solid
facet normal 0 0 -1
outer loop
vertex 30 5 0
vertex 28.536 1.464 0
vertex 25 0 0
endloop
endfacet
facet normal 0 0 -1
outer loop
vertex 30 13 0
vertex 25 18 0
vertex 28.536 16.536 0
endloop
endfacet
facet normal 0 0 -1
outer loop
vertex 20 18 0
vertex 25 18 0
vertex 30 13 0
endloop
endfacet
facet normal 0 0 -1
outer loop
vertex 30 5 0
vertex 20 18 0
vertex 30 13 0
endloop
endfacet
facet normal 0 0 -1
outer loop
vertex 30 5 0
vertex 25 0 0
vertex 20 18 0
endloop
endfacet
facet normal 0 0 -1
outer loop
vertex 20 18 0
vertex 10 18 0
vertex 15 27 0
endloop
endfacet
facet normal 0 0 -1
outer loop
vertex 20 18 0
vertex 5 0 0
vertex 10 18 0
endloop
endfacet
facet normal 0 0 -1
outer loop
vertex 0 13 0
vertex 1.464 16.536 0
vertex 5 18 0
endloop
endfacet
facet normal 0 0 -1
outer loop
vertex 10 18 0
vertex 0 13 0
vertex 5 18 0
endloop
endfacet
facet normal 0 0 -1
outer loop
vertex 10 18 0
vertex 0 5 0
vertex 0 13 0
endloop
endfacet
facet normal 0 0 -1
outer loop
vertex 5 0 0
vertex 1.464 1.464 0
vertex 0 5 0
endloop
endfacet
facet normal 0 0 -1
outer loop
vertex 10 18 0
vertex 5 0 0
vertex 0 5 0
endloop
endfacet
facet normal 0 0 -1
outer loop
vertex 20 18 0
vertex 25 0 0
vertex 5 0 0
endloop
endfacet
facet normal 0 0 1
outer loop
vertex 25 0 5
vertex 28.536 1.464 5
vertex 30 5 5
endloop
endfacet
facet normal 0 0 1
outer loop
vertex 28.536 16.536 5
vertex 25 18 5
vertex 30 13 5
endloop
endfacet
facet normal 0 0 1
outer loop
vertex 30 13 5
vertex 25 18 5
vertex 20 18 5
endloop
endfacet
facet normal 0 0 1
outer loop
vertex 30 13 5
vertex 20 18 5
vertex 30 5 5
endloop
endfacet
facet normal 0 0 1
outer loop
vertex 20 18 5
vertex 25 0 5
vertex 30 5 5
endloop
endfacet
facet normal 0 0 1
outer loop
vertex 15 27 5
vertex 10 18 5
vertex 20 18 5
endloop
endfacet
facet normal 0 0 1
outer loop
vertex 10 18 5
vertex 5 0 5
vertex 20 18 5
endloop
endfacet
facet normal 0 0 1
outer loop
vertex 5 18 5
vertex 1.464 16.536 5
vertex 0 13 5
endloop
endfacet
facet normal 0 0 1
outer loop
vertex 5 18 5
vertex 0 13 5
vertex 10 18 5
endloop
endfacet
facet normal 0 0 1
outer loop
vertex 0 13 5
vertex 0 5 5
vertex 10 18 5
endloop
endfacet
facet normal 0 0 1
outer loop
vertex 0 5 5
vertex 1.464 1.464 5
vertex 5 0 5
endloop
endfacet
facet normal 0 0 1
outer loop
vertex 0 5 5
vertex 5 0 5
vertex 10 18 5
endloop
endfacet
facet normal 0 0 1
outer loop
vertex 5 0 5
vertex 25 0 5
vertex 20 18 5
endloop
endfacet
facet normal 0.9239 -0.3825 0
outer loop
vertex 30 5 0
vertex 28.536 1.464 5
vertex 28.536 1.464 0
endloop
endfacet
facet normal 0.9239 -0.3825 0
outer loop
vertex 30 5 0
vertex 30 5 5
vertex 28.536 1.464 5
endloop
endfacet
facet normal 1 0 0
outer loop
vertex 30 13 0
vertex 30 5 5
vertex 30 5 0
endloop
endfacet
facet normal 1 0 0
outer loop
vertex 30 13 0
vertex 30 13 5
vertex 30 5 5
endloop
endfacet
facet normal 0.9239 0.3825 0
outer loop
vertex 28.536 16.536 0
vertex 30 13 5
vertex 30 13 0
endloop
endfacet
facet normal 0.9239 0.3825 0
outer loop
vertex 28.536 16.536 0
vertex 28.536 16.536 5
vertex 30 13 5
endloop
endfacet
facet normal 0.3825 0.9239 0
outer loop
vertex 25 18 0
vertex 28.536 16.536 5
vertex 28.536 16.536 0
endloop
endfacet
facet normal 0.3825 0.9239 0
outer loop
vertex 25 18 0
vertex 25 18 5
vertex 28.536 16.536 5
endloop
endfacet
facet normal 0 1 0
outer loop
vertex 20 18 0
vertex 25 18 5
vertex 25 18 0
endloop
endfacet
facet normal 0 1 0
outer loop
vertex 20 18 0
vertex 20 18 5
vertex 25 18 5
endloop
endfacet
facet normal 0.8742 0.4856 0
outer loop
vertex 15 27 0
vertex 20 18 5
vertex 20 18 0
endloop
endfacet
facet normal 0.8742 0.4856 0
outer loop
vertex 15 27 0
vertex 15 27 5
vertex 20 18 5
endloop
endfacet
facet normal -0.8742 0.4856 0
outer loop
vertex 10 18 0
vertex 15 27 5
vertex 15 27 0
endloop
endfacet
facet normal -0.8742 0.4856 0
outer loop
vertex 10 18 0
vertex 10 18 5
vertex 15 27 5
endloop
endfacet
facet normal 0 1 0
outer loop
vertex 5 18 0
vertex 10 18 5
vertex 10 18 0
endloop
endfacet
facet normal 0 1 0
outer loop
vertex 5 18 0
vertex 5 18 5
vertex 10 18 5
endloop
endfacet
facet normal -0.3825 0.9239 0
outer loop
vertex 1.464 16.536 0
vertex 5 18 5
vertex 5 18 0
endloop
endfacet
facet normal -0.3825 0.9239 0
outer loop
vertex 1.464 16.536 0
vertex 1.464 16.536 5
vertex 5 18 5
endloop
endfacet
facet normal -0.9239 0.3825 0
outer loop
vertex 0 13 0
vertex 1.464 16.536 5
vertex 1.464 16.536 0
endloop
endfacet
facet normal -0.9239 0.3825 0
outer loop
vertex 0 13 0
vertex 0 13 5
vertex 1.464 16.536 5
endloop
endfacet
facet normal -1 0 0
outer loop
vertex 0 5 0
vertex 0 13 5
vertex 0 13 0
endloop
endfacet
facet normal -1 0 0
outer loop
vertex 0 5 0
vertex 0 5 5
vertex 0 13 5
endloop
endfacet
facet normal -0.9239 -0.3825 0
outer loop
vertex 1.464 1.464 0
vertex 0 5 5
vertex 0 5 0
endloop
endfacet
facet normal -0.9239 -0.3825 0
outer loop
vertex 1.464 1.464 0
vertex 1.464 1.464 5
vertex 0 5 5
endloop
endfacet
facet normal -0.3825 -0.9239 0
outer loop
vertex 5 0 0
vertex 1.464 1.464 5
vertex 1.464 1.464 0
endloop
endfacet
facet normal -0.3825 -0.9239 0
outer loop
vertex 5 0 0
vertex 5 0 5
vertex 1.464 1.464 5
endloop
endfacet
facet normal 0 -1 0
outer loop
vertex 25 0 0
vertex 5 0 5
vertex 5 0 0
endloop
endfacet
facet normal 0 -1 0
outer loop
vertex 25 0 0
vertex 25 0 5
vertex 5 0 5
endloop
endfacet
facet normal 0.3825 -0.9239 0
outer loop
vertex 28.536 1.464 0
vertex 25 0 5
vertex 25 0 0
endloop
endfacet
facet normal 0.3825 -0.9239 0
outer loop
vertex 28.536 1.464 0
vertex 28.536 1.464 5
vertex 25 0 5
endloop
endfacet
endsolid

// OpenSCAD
$fn = 32;

// ----------------------------------------------------------------------
// Ratchet pawl: 30 x 18 mm body, beak 9 mm сверху
// ----------------------------------------------------------------------

// --- parameters (mm) ---
profile_height = 5;       // extrusion height
profile_points = 15;      // points of the closed outline

profile = [[0, 5], [1.464, 1.464], [5, 0], [25, 0], [28.536, 1.464], [30, 5], [30, 13], [28.536, 16.536], [25, 18], [20, 18], [15, 27], [10, 18], [5, 18], [1.464, 16.536], [0, 13]];  // single closed polygon, 15 points, counter clockwise

// --- the one profile operation ---
linear_extrude(height = profile_height) polygon(points = profile);
